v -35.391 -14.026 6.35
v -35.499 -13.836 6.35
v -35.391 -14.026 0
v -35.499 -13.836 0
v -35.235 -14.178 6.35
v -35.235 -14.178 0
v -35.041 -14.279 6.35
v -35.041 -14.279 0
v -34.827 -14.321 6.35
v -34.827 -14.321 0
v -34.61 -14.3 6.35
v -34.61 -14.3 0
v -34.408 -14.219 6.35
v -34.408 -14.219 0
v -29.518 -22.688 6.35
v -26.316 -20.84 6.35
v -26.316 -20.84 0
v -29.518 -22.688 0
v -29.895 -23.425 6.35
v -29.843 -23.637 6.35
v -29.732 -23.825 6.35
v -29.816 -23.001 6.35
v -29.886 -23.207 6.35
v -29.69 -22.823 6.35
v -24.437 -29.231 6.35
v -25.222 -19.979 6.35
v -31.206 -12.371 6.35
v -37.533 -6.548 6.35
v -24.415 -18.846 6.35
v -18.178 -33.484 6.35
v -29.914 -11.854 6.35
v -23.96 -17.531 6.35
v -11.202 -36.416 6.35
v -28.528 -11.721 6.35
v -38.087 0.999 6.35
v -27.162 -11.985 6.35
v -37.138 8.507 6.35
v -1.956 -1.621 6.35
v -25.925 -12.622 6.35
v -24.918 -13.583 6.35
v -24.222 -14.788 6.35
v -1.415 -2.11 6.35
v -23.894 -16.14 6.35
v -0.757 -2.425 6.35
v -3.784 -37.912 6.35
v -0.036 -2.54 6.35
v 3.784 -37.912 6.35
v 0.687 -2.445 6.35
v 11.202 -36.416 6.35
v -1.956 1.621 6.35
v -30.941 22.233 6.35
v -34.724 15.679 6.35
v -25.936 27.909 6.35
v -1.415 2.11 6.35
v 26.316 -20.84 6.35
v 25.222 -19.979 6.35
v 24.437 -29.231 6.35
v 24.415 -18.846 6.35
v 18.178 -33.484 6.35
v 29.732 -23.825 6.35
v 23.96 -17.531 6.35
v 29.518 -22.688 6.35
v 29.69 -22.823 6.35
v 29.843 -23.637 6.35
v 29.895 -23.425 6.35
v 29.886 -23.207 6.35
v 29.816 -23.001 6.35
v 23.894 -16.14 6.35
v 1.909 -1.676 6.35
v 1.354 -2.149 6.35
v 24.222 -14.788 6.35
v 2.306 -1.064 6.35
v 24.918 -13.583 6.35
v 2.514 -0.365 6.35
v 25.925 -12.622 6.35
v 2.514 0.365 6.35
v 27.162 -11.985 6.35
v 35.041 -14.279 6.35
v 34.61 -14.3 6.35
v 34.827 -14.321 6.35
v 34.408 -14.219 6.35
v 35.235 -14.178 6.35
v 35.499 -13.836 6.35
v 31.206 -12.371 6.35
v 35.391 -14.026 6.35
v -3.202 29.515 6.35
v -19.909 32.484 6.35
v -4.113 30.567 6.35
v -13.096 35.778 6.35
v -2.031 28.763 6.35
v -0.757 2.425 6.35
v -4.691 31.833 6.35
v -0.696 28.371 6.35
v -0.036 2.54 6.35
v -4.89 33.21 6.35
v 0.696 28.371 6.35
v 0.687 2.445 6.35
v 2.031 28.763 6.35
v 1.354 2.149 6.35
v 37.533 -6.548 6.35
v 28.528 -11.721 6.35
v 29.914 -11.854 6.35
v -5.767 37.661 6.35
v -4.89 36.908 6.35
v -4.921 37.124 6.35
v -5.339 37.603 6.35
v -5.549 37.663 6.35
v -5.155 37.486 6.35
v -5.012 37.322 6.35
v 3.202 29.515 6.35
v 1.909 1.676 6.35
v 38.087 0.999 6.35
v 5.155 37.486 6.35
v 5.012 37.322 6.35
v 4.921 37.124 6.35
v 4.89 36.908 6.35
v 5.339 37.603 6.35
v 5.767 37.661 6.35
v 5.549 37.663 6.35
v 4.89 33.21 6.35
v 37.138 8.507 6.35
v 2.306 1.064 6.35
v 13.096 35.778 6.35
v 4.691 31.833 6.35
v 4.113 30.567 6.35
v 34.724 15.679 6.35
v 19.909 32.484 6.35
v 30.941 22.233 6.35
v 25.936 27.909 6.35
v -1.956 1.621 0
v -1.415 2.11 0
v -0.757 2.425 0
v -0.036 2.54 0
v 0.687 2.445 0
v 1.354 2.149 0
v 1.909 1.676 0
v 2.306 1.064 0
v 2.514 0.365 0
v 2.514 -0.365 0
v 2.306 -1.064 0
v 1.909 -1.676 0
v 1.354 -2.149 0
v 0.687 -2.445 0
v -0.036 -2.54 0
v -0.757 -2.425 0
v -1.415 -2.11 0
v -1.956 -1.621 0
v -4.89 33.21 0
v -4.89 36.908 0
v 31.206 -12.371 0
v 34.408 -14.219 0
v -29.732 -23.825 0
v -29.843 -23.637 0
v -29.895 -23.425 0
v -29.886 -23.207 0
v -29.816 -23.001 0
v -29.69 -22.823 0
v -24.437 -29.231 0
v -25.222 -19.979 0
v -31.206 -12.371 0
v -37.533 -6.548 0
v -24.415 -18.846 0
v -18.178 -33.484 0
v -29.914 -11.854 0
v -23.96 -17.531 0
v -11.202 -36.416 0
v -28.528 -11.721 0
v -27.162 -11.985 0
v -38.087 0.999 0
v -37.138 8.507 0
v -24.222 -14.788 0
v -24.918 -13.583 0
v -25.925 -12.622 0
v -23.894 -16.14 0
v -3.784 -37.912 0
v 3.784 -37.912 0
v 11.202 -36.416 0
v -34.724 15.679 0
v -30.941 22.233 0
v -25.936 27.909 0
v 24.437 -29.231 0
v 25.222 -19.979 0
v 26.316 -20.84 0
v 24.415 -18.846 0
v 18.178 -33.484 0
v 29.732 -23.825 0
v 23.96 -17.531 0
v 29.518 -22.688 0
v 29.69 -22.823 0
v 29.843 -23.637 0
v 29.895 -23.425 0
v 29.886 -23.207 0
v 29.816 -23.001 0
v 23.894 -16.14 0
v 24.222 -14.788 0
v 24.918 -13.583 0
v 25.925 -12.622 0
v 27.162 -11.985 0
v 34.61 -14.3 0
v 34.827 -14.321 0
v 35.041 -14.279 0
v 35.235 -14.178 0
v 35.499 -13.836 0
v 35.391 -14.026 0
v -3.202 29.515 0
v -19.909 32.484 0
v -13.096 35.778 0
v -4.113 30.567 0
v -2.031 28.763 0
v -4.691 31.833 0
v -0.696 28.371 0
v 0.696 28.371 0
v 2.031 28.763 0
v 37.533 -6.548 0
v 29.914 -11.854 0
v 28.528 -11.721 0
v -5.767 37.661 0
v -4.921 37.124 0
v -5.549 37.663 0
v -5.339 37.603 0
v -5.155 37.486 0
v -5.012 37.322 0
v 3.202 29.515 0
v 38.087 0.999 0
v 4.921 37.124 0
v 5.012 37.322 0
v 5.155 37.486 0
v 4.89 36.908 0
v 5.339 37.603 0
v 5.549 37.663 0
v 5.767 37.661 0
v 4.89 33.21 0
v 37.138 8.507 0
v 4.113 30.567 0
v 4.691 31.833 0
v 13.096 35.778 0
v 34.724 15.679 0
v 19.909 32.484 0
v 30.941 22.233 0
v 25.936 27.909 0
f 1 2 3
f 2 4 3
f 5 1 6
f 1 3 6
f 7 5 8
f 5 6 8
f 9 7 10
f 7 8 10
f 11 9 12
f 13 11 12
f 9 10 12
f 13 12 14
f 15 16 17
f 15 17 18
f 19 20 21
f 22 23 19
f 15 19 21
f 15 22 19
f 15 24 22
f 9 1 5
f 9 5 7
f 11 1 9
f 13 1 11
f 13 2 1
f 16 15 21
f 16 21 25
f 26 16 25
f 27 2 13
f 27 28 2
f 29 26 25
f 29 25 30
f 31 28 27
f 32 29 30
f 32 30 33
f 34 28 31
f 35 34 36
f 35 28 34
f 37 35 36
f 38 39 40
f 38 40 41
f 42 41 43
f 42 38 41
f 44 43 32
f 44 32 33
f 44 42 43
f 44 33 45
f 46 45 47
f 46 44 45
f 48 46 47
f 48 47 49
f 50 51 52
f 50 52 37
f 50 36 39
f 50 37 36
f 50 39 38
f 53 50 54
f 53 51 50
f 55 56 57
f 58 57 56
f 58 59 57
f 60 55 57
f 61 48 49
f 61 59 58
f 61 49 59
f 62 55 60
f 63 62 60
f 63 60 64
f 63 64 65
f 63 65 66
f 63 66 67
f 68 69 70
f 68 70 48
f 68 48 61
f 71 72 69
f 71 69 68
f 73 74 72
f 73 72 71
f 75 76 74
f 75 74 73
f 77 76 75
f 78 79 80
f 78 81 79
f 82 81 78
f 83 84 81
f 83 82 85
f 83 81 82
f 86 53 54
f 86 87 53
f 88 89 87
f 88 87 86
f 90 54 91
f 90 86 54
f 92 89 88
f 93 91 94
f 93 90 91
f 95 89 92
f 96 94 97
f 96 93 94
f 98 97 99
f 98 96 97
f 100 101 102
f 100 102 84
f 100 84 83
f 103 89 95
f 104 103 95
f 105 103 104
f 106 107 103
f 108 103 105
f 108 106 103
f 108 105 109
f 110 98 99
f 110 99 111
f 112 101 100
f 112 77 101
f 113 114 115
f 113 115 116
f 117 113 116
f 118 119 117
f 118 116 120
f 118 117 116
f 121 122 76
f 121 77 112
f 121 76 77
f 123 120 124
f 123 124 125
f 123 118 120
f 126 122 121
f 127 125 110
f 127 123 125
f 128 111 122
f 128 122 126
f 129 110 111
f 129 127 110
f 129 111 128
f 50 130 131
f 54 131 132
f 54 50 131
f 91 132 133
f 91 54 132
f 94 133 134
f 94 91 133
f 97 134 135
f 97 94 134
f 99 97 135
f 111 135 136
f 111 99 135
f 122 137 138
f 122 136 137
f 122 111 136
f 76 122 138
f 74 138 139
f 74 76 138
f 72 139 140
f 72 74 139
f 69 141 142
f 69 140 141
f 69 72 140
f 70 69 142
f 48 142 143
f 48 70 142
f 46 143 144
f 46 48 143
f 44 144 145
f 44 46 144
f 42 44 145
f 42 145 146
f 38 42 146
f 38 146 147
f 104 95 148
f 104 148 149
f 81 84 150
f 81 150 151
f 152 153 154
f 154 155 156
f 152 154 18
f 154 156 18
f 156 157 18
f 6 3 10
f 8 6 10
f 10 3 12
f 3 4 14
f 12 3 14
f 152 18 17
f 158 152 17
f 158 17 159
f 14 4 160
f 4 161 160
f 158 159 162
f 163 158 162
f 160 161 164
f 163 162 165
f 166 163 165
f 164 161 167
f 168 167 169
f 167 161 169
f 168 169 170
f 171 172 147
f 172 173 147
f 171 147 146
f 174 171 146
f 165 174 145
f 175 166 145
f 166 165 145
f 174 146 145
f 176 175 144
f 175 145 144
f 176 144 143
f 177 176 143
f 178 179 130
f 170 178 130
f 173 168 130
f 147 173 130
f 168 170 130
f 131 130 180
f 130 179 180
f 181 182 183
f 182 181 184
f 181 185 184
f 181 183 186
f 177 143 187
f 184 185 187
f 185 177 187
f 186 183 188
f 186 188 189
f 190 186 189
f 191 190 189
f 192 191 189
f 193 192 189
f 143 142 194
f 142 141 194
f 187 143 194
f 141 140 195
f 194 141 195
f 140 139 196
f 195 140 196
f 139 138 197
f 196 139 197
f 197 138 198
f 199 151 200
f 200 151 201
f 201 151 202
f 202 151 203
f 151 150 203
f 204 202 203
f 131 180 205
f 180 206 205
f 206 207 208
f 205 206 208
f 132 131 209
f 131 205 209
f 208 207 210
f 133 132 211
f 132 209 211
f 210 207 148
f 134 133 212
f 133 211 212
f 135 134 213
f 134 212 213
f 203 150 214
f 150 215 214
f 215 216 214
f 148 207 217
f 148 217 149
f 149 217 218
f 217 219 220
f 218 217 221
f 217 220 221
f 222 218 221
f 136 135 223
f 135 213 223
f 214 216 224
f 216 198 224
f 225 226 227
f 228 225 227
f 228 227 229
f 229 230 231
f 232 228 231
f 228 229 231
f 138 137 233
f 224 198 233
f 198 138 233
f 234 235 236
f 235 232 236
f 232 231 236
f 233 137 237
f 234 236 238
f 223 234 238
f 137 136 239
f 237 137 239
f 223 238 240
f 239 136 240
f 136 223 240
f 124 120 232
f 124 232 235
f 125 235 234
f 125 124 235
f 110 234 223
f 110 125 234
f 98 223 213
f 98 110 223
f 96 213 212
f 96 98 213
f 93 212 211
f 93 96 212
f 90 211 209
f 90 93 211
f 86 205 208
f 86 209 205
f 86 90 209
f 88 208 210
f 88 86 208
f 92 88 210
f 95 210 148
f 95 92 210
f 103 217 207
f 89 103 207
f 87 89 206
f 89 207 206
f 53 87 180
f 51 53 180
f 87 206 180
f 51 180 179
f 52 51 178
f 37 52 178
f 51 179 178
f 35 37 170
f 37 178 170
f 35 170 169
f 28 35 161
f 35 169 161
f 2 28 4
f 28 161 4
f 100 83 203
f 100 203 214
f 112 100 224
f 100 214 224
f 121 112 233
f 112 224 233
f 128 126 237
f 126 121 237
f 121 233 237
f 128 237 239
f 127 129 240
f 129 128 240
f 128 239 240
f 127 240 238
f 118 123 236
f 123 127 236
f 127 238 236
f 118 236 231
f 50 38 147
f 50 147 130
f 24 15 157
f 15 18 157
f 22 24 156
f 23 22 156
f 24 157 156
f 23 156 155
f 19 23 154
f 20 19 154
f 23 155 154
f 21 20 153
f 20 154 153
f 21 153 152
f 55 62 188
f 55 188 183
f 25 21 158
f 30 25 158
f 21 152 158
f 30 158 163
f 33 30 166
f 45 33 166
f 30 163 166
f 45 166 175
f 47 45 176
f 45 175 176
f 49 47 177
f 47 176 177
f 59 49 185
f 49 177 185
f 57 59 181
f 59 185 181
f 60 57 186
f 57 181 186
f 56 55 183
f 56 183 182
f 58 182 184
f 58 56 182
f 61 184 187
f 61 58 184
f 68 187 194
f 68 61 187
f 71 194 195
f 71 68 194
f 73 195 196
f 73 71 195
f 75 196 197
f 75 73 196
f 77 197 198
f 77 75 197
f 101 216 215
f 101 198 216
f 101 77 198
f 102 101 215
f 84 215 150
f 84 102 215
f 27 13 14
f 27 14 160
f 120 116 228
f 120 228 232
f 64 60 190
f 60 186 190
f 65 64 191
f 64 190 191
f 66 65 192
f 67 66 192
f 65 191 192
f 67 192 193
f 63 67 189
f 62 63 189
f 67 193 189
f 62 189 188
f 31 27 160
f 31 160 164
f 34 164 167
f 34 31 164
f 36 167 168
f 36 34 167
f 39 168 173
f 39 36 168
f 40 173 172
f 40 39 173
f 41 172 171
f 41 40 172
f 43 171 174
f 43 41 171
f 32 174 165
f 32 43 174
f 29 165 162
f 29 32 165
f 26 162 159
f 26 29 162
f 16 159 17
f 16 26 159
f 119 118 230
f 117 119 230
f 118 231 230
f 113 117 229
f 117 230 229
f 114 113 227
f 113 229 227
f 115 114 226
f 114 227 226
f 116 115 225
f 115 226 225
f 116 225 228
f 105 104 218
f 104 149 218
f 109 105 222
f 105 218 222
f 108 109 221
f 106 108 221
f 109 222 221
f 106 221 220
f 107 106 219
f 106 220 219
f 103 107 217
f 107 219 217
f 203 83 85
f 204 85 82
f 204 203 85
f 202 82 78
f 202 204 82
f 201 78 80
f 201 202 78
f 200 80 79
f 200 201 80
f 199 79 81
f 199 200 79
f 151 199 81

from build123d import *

# Parameters (mm, degrees)
SKETCH1_R           = 38.1
BOSS_EXTRUDE1_DEPTH = 6.35
CUT_EXTRUDE1_DEPTH  = 7.35
FILLET1_R           = 0.762
CUT_EXTRUDE3_DEPTH  = 7.35


with BuildPart() as part:
    # Sketch1 → Boss-Extrude1 (new body)
    with BuildSketch(Plane.XY):
        Circle(SKETCH1_R)
    extrude(amount=BOSS_EXTRUDE1_DEPTH)

    # Sketch2 → Cut-Extrude1 (cut, through all)
    with BuildSketch(Plane.XY.offset(6.35)):
        with BuildLine():
            Line((-4.8895, 33.2105), (-4.8895, 37.784954542))
            ThreePointArc((-4.8895, 37.784954542), (0, 38.1), (4.8895, 37.784954542))
            Line((4.8895, 37.784954542), (4.8895, 33.2105))
            ThreePointArc((4.8895, 33.2105), (0, 28.321), (-4.8895, 33.2105))
        make_face()
        with BuildLine():
            Line((31.205886672, -12.370818788), (35.167480514, -14.658046059))
            ThreePointArc((35.167480514, -14.658046059), (32.995567884, -19.05), (30.277980514, -23.126908483))
            Line((30.277980514, -23.126908483), (26.316386672, -20.839681212))
            ThreePointArc((26.316386672, -20.839681212), (24.526705461, -14.1605), (31.205886672, -12.370818788))
        make_face()
        with BuildLine():
            Line((-26.316386672, -20.839681212), (-30.277980514, -23.126908483))
            ThreePointArc((-30.277980514, -23.126908483), (-32.995567884, -19.05), (-35.167480514, -14.658046059))
            Line((-35.167480514, -14.658046059), (-31.205886672, -12.370818788))
            ThreePointArc((-31.205886672, -12.370818788), (-24.526705461, -14.1605), (-26.316386672, -20.839681212))
        make_face()
    extrude(amount=-CUT_EXTRUDE1_DEPTH, mode=Mode.SUBTRACT)

    # Fillet1
    fillet1_edges = [part.edges().sort_by_distance(p)[0] for p in [
        (-4.8895, 37.784954542, 3.175),
        (4.8895, 37.784954542, 3.175),
        (35.167480514, -14.658046059, 3.175),
        (30.277980514, -23.126908483, 3.175),
        (-30.277980514, -23.126908483, 3.175),
        (-35.167480514, -14.658046059, 3.175),
    ]]
    fillet(fillet1_edges, radius=FILLET1_R)

    # Sketch4 → Cut-Extrude3 (cut, through all)
    with BuildSketch(Plane.XY.offset(6.35)):
        with BuildLine():
            Line((-1.9558, -1.62063147), (-1.9558, 1.62063147))
            ThreePointArc((-1.9558, 1.62063147), (2.54, 0), (-1.9558, -1.62063147))
        make_face()
    extrude(amount=-CUT_EXTRUDE3_DEPTH, mode=Mode.SUBTRACT)


solid = part.part
